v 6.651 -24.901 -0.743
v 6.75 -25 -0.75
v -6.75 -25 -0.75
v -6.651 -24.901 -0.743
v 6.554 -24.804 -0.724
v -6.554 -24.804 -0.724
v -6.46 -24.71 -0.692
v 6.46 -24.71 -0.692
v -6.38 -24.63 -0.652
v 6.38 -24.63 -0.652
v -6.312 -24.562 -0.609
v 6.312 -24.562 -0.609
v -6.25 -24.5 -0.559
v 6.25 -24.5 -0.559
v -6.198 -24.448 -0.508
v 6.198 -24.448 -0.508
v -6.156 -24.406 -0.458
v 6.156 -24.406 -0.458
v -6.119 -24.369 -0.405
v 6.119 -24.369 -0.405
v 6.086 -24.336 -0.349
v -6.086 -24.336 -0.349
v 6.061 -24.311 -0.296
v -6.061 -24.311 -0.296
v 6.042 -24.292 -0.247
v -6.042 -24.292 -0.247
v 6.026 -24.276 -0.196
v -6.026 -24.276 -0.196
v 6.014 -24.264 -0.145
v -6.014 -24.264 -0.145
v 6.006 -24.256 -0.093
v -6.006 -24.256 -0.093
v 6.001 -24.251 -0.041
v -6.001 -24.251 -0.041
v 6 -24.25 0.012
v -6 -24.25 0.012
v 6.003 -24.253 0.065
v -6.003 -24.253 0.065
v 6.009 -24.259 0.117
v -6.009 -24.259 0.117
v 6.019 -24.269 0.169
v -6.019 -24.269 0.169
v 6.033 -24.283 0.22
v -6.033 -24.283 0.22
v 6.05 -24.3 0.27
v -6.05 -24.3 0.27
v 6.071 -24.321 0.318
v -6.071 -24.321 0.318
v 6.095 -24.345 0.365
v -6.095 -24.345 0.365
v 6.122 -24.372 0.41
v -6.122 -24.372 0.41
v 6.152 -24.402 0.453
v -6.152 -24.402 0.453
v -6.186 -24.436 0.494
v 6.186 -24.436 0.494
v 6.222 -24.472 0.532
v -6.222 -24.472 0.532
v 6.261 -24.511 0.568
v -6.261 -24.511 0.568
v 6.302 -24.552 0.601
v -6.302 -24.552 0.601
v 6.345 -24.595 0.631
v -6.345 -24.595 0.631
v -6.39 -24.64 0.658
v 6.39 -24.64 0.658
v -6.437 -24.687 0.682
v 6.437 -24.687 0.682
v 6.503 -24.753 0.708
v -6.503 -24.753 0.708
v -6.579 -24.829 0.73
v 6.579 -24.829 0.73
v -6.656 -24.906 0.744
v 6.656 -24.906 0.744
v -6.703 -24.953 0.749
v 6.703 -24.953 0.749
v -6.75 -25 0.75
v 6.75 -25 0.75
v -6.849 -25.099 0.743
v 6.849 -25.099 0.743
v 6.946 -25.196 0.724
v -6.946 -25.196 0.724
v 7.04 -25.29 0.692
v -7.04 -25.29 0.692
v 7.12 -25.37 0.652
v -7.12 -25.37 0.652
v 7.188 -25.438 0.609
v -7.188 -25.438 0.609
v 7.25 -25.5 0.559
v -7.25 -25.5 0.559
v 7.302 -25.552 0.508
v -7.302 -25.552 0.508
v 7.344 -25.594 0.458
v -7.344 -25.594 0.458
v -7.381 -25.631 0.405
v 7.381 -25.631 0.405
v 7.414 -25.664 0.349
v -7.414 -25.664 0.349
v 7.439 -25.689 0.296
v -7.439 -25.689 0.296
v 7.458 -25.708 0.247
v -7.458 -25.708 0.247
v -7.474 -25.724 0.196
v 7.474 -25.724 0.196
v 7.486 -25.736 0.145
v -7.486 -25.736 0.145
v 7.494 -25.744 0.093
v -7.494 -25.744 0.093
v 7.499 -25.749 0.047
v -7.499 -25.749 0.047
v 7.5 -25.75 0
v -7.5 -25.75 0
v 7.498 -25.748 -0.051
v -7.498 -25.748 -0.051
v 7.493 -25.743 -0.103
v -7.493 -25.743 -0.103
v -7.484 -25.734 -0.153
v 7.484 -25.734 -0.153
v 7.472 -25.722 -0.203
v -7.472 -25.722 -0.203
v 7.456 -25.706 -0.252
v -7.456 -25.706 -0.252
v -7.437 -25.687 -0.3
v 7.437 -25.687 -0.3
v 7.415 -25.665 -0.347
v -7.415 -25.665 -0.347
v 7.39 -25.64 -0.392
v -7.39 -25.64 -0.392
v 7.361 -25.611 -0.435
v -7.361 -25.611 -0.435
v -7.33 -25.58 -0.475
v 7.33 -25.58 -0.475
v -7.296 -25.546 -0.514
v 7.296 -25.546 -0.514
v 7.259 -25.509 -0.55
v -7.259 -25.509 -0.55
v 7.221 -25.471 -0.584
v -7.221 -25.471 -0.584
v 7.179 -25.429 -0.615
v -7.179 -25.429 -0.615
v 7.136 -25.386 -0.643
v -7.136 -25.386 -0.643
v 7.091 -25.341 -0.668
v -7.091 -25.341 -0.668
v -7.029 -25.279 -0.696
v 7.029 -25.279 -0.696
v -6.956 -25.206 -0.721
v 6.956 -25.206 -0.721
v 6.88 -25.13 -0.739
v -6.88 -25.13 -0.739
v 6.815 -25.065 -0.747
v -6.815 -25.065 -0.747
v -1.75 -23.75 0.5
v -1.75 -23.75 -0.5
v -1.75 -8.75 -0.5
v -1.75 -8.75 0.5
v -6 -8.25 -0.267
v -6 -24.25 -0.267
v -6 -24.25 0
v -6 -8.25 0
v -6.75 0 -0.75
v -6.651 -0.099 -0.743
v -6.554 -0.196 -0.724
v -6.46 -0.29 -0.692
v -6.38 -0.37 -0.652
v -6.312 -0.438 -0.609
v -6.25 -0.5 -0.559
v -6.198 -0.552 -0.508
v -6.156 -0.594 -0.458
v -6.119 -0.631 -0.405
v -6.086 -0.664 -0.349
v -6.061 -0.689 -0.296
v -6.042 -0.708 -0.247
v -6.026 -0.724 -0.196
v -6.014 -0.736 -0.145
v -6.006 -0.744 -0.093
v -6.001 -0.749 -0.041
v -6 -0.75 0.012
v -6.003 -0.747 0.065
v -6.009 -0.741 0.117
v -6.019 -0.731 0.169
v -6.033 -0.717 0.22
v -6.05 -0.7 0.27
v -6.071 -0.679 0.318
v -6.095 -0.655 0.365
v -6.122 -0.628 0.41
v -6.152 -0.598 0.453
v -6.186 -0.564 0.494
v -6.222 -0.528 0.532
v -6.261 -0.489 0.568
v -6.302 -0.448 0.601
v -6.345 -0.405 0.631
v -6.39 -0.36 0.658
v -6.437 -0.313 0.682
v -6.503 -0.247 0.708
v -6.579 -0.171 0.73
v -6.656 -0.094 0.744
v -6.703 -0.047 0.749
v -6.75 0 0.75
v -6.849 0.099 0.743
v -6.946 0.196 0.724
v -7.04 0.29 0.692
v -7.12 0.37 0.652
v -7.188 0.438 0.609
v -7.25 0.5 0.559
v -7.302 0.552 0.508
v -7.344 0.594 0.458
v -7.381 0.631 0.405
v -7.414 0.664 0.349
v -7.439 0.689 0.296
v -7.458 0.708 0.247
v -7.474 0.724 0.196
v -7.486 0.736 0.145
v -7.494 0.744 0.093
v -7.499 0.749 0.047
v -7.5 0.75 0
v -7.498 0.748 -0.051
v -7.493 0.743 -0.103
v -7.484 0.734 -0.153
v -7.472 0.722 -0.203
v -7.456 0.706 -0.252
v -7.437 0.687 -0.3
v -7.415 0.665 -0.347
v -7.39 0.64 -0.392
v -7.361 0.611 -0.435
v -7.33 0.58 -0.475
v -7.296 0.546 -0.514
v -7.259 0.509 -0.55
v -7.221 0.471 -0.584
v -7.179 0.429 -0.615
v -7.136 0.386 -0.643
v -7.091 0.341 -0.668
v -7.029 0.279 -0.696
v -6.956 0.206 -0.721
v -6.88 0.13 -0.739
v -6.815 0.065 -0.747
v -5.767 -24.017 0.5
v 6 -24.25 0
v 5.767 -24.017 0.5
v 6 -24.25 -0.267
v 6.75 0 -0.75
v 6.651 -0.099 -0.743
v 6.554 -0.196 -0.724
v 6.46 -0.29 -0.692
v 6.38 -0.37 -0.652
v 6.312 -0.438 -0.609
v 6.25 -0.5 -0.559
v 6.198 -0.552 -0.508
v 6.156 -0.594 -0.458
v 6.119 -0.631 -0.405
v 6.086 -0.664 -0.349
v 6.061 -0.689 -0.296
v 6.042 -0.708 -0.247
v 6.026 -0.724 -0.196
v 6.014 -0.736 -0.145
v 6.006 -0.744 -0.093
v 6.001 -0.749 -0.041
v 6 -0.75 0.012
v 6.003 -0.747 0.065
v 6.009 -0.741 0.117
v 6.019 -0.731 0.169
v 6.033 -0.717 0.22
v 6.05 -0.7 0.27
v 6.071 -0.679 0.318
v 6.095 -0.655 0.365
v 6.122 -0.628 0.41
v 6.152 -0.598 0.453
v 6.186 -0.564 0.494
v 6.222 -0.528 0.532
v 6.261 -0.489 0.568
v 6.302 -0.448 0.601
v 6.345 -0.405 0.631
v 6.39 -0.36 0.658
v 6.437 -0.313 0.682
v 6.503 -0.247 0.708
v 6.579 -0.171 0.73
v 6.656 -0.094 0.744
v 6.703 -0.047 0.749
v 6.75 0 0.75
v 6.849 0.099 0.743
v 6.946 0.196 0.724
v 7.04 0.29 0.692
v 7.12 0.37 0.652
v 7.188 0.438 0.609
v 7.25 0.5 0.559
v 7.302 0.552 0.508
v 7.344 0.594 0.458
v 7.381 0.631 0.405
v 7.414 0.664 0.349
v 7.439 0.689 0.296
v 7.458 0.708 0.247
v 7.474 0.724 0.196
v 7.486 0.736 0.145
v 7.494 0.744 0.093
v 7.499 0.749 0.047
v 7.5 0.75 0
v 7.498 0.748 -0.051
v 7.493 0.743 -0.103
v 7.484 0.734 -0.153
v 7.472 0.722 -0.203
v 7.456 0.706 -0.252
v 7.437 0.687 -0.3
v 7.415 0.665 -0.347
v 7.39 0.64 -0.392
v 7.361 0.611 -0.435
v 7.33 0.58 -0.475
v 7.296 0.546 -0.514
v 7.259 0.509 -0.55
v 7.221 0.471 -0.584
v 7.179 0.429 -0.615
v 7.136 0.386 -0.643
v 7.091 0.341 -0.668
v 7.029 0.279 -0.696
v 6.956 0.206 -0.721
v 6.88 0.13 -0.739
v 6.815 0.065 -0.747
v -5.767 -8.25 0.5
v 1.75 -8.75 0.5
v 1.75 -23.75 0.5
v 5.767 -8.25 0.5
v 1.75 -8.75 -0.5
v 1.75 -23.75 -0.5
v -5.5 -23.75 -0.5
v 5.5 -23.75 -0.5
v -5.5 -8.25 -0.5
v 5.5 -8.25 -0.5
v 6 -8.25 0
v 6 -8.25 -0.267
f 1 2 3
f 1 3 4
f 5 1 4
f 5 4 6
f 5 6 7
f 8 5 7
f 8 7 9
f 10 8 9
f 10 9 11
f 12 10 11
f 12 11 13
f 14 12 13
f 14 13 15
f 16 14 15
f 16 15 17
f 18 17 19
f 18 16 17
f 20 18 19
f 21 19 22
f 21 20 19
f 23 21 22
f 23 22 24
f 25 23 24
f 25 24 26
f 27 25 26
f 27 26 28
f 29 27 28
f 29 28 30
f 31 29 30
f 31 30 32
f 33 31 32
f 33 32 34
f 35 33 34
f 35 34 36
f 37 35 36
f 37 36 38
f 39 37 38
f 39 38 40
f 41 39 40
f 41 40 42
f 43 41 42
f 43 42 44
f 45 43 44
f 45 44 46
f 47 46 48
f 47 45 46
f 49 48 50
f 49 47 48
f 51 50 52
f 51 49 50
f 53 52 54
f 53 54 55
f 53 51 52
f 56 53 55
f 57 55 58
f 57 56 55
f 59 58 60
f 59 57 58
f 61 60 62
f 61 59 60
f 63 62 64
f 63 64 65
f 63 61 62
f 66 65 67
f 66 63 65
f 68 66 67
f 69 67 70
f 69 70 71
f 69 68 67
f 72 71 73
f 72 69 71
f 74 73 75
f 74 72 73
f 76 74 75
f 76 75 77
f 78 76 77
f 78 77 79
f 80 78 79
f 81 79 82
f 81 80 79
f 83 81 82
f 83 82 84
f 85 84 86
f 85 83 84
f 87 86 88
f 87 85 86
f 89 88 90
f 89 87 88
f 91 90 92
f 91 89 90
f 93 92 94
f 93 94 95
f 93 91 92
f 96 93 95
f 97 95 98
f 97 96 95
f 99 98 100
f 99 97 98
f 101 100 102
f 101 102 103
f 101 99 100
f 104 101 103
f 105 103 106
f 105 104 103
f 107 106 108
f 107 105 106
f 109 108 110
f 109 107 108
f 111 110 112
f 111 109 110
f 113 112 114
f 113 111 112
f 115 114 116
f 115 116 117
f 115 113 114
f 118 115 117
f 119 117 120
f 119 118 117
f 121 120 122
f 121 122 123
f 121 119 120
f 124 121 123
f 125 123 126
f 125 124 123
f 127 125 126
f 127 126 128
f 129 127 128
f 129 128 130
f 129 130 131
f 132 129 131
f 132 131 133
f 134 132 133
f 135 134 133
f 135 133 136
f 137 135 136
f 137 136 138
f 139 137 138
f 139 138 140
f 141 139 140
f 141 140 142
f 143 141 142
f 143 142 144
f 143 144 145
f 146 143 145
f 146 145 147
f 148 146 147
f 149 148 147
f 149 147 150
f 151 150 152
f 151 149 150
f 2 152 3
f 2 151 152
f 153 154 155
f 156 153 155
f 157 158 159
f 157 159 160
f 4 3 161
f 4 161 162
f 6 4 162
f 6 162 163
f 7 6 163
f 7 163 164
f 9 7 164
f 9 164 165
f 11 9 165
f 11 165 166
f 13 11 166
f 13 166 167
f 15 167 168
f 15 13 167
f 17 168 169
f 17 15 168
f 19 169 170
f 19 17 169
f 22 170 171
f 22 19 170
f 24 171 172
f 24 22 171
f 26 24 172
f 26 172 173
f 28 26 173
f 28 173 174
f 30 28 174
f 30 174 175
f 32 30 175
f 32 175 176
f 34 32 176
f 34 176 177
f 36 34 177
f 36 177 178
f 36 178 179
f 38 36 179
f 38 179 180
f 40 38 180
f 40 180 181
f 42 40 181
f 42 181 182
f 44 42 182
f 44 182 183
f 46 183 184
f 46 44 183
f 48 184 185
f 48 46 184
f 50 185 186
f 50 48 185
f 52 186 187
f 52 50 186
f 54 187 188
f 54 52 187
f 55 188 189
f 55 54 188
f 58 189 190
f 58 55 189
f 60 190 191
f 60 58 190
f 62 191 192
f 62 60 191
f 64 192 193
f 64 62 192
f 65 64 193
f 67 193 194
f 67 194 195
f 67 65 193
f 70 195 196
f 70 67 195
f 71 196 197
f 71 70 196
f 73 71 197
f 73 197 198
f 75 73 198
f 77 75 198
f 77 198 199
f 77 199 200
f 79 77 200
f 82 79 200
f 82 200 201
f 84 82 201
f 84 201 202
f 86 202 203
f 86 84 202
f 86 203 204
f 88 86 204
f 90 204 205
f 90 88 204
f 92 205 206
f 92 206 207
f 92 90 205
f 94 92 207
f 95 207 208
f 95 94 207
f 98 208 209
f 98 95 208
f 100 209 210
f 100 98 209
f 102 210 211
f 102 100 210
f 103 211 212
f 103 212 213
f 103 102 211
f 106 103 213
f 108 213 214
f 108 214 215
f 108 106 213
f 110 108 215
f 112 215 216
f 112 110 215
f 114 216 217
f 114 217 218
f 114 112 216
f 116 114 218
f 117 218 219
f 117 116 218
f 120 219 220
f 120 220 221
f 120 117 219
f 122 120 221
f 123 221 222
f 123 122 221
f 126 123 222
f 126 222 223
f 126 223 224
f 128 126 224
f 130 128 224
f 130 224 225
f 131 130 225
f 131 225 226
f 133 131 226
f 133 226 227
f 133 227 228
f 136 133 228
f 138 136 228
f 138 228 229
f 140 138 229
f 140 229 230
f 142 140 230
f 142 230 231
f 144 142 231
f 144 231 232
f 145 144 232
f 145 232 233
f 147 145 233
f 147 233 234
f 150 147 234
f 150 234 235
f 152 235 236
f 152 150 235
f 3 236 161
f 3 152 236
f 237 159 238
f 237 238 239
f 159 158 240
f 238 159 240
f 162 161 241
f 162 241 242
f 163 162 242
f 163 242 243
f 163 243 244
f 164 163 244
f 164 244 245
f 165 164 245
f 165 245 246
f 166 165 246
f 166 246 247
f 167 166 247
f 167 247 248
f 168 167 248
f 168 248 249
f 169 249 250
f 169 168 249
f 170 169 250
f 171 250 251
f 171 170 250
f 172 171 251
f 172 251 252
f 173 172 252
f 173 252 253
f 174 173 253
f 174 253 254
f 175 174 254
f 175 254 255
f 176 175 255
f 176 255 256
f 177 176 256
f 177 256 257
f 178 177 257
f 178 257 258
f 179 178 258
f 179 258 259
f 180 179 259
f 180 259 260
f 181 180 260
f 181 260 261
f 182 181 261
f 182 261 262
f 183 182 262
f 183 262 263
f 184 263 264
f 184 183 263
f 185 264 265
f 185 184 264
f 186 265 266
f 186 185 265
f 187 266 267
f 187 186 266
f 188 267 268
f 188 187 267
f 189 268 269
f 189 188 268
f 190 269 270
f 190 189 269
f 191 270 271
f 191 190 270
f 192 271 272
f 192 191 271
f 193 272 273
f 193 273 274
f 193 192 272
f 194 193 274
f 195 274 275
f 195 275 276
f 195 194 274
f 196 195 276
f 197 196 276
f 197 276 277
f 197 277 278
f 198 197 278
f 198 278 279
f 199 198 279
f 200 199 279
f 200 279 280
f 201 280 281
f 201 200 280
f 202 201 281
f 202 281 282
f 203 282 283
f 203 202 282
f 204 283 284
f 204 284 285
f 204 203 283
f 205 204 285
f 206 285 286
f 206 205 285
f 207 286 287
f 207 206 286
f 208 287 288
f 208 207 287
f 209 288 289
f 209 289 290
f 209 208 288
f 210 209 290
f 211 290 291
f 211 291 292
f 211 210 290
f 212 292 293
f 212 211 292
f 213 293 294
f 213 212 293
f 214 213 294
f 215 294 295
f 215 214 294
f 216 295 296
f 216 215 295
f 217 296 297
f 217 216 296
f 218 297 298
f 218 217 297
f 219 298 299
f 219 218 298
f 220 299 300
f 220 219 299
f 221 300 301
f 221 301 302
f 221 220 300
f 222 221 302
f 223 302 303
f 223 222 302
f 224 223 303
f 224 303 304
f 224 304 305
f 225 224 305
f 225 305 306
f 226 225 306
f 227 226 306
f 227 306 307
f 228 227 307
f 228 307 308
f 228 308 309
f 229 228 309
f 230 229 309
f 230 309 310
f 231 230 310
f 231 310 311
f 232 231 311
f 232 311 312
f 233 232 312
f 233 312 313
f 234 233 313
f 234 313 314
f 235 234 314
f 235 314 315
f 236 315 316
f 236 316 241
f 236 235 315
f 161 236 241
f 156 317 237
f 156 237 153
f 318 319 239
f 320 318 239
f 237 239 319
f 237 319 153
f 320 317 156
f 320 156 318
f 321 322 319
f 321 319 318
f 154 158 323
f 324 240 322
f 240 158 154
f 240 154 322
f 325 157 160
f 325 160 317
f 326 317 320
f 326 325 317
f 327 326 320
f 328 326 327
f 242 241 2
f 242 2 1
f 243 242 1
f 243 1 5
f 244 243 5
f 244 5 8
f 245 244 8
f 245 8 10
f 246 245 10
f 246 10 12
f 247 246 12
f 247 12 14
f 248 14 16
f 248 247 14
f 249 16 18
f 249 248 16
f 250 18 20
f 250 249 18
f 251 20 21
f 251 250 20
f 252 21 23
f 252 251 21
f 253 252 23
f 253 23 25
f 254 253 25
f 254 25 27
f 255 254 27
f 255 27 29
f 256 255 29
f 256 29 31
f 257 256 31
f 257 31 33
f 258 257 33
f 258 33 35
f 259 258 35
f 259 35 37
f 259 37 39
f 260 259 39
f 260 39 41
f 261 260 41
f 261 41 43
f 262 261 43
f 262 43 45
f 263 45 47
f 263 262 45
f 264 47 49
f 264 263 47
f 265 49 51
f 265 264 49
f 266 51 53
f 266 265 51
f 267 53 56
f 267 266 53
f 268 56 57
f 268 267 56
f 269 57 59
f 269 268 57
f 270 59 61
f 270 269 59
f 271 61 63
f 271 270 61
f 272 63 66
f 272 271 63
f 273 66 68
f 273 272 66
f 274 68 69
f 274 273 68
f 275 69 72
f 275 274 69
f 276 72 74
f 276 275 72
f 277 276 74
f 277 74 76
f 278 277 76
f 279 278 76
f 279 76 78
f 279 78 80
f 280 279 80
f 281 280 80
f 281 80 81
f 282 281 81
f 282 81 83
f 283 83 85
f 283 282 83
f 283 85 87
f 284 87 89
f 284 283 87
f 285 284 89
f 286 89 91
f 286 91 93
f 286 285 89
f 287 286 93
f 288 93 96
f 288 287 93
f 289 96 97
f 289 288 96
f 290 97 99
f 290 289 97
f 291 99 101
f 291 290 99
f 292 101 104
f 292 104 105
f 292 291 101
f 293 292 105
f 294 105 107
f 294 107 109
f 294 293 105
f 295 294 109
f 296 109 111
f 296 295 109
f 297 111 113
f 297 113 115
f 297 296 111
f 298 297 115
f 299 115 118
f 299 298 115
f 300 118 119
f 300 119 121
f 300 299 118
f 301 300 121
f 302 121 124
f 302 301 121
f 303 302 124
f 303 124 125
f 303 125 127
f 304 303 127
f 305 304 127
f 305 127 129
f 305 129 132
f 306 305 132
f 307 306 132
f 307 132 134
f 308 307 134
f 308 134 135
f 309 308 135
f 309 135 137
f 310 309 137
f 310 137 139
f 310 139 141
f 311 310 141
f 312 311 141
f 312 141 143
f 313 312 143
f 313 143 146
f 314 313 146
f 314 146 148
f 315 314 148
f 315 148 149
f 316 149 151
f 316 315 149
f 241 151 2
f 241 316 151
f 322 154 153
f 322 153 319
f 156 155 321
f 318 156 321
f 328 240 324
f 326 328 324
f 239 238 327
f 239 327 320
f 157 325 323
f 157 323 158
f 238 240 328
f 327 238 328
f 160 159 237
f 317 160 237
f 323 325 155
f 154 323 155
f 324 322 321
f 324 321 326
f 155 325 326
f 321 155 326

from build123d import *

# Parameters (mm, degrees)
SWEEP1_PROFILE_R         = 0.75
BOSS_EXTRUDE1_DEPTH      = 0.5
BOSS_EXTRUDE1_DEPTH_BACK = 0.5
SKETCH15_W               = 12
SKETCH15_H               = 16
SKETCH15_W_2             = 3.5
SKETCH15_H_2             = 15
CHAMFER1_SIZE            = 0.5
CHAMFER1_SIZE_2          = 0.233153829


with BuildPart() as part:
    # Sweep1: sweep along a path in Sketch1
    with BuildLine(Plane.XY) as sweep1_path:
        Line((0, 0), (-6.75, 0))
        Line((-6.75, 0), (-6.75, -25))
        Line((-6.75, -25), (6.75, -25))
        Line((6.75, -25), (6.75, 0))
        Line((6.75, 0), (0, 0))
    # Sweep1 profile (on start of the path) → Sweep1 (sweep)
    with BuildSketch(Plane(origin=(0, 0, 0), x_dir=(0, 0, -1), z_dir=(-1, 0, 0))):
        Circle(SWEEP1_PROFILE_R)
    sweep(path=sweep1_path.line, transition=Transition.RIGHT)


with BuildPart() as body_2:
    # Sketch15 → Boss-Extrude1 (new, two sides: drawn at the far end of the back side and taken through both)
    with BuildSketch(Plane.XY.offset(-BOSS_EXTRUDE1_DEPTH_BACK)):
        with Locations((0, -16.25)):
            Rectangle(SKETCH15_W, SKETCH15_H)
        with Locations((0, -16.25)):
            Rectangle(SKETCH15_W_2, SKETCH15_H_2, mode=Mode.SUBTRACT)
    extrude(amount=BOSS_EXTRUDE1_DEPTH + BOSS_EXTRUDE1_DEPTH_BACK)

    # Chamfer1
    # the kernel refuses this chamfer: 0.5, 0.233153829 mm, written as the material it takes off along each edge
    with BuildSketch(Plane(origin=(-6, -25.545487736, -0.5), x_dir=(0.9998669641130704, 0, -0.016311164131110275), z_dir=(0, 1, 0)), Plane(origin=(6, -6.954512264, 0.5), x_dir=(0.016311164131110483, 0, -0.9998669641130704), z_dir=(0, -1, 0)), Plane(origin=(-6, -25.545487736, 0.5), x_dir=(-0.016311164131110483, 0, -0.9998669641130704), z_dir=(0, 1, 0))) as chamfer1_piece_1:
        Polygon((CHAMFER1_SIZE * 0.999866964113, -CHAMFER1_SIZE * 0.0163111641311), (-CHAMFER1_SIZE_2 * 0.0163111641365, -CHAMFER1_SIZE_2 * 0.999866964445), (0, 0), align=None)
    extrude(amount=18.590975471, mode=Mode.SUBTRACT)
    with BuildSketch(Plane(origin=(7.295487736, -24.25, -0.5), x_dir=(0, -0.07481330637060621, 0.9971975577536769), z_dir=(-1, 0, 0))) as chamfer1_piece_2:
        Polygon((CHAMFER1_SIZE_2 * 0.997197558085, CHAMFER1_SIZE_2 * 0.0748133063955), (-CHAMFER1_SIZE * 0.0748133063706, CHAMFER1_SIZE * 0.997197557754), (0, 0), align=None)
    extrude(amount=14.590975471, mode=Mode.SUBTRACT)
    with BuildSketch(Plane(origin=(6, -6.954512264, -0.5), x_dir=(0.07481330637059892, 0, 0.9971975577536775), z_dir=(0, -1, 0))) as chamfer1_piece_3:
        Polygon((CHAMFER1_SIZE_2 * 0.997197558085, CHAMFER1_SIZE_2 * 0.0748133063955), (-CHAMFER1_SIZE * 0.0748133063706, CHAMFER1_SIZE * 0.997197557754), (0, 0), align=None)
    extrude(amount=18.590975471, mode=Mode.SUBTRACT)
    with BuildSketch(Plane(origin=(7.295487736, -24.25, 0.5), x_dir=(0, -0.01631116413110877, -0.9998669641130704), z_dir=(-1, 0, 0))) as chamfer1_piece_4:
        Polygon((CHAMFER1_SIZE * 0.999866964113, -CHAMFER1_SIZE * 0.0163111641311), (-CHAMFER1_SIZE_2 * 0.0163111641365, -CHAMFER1_SIZE_2 * 0.999866964445), (0, 0), align=None)
    extrude(amount=14.590975471, mode=Mode.SUBTRACT)


solid = Compound([part.part, body_2.part])
